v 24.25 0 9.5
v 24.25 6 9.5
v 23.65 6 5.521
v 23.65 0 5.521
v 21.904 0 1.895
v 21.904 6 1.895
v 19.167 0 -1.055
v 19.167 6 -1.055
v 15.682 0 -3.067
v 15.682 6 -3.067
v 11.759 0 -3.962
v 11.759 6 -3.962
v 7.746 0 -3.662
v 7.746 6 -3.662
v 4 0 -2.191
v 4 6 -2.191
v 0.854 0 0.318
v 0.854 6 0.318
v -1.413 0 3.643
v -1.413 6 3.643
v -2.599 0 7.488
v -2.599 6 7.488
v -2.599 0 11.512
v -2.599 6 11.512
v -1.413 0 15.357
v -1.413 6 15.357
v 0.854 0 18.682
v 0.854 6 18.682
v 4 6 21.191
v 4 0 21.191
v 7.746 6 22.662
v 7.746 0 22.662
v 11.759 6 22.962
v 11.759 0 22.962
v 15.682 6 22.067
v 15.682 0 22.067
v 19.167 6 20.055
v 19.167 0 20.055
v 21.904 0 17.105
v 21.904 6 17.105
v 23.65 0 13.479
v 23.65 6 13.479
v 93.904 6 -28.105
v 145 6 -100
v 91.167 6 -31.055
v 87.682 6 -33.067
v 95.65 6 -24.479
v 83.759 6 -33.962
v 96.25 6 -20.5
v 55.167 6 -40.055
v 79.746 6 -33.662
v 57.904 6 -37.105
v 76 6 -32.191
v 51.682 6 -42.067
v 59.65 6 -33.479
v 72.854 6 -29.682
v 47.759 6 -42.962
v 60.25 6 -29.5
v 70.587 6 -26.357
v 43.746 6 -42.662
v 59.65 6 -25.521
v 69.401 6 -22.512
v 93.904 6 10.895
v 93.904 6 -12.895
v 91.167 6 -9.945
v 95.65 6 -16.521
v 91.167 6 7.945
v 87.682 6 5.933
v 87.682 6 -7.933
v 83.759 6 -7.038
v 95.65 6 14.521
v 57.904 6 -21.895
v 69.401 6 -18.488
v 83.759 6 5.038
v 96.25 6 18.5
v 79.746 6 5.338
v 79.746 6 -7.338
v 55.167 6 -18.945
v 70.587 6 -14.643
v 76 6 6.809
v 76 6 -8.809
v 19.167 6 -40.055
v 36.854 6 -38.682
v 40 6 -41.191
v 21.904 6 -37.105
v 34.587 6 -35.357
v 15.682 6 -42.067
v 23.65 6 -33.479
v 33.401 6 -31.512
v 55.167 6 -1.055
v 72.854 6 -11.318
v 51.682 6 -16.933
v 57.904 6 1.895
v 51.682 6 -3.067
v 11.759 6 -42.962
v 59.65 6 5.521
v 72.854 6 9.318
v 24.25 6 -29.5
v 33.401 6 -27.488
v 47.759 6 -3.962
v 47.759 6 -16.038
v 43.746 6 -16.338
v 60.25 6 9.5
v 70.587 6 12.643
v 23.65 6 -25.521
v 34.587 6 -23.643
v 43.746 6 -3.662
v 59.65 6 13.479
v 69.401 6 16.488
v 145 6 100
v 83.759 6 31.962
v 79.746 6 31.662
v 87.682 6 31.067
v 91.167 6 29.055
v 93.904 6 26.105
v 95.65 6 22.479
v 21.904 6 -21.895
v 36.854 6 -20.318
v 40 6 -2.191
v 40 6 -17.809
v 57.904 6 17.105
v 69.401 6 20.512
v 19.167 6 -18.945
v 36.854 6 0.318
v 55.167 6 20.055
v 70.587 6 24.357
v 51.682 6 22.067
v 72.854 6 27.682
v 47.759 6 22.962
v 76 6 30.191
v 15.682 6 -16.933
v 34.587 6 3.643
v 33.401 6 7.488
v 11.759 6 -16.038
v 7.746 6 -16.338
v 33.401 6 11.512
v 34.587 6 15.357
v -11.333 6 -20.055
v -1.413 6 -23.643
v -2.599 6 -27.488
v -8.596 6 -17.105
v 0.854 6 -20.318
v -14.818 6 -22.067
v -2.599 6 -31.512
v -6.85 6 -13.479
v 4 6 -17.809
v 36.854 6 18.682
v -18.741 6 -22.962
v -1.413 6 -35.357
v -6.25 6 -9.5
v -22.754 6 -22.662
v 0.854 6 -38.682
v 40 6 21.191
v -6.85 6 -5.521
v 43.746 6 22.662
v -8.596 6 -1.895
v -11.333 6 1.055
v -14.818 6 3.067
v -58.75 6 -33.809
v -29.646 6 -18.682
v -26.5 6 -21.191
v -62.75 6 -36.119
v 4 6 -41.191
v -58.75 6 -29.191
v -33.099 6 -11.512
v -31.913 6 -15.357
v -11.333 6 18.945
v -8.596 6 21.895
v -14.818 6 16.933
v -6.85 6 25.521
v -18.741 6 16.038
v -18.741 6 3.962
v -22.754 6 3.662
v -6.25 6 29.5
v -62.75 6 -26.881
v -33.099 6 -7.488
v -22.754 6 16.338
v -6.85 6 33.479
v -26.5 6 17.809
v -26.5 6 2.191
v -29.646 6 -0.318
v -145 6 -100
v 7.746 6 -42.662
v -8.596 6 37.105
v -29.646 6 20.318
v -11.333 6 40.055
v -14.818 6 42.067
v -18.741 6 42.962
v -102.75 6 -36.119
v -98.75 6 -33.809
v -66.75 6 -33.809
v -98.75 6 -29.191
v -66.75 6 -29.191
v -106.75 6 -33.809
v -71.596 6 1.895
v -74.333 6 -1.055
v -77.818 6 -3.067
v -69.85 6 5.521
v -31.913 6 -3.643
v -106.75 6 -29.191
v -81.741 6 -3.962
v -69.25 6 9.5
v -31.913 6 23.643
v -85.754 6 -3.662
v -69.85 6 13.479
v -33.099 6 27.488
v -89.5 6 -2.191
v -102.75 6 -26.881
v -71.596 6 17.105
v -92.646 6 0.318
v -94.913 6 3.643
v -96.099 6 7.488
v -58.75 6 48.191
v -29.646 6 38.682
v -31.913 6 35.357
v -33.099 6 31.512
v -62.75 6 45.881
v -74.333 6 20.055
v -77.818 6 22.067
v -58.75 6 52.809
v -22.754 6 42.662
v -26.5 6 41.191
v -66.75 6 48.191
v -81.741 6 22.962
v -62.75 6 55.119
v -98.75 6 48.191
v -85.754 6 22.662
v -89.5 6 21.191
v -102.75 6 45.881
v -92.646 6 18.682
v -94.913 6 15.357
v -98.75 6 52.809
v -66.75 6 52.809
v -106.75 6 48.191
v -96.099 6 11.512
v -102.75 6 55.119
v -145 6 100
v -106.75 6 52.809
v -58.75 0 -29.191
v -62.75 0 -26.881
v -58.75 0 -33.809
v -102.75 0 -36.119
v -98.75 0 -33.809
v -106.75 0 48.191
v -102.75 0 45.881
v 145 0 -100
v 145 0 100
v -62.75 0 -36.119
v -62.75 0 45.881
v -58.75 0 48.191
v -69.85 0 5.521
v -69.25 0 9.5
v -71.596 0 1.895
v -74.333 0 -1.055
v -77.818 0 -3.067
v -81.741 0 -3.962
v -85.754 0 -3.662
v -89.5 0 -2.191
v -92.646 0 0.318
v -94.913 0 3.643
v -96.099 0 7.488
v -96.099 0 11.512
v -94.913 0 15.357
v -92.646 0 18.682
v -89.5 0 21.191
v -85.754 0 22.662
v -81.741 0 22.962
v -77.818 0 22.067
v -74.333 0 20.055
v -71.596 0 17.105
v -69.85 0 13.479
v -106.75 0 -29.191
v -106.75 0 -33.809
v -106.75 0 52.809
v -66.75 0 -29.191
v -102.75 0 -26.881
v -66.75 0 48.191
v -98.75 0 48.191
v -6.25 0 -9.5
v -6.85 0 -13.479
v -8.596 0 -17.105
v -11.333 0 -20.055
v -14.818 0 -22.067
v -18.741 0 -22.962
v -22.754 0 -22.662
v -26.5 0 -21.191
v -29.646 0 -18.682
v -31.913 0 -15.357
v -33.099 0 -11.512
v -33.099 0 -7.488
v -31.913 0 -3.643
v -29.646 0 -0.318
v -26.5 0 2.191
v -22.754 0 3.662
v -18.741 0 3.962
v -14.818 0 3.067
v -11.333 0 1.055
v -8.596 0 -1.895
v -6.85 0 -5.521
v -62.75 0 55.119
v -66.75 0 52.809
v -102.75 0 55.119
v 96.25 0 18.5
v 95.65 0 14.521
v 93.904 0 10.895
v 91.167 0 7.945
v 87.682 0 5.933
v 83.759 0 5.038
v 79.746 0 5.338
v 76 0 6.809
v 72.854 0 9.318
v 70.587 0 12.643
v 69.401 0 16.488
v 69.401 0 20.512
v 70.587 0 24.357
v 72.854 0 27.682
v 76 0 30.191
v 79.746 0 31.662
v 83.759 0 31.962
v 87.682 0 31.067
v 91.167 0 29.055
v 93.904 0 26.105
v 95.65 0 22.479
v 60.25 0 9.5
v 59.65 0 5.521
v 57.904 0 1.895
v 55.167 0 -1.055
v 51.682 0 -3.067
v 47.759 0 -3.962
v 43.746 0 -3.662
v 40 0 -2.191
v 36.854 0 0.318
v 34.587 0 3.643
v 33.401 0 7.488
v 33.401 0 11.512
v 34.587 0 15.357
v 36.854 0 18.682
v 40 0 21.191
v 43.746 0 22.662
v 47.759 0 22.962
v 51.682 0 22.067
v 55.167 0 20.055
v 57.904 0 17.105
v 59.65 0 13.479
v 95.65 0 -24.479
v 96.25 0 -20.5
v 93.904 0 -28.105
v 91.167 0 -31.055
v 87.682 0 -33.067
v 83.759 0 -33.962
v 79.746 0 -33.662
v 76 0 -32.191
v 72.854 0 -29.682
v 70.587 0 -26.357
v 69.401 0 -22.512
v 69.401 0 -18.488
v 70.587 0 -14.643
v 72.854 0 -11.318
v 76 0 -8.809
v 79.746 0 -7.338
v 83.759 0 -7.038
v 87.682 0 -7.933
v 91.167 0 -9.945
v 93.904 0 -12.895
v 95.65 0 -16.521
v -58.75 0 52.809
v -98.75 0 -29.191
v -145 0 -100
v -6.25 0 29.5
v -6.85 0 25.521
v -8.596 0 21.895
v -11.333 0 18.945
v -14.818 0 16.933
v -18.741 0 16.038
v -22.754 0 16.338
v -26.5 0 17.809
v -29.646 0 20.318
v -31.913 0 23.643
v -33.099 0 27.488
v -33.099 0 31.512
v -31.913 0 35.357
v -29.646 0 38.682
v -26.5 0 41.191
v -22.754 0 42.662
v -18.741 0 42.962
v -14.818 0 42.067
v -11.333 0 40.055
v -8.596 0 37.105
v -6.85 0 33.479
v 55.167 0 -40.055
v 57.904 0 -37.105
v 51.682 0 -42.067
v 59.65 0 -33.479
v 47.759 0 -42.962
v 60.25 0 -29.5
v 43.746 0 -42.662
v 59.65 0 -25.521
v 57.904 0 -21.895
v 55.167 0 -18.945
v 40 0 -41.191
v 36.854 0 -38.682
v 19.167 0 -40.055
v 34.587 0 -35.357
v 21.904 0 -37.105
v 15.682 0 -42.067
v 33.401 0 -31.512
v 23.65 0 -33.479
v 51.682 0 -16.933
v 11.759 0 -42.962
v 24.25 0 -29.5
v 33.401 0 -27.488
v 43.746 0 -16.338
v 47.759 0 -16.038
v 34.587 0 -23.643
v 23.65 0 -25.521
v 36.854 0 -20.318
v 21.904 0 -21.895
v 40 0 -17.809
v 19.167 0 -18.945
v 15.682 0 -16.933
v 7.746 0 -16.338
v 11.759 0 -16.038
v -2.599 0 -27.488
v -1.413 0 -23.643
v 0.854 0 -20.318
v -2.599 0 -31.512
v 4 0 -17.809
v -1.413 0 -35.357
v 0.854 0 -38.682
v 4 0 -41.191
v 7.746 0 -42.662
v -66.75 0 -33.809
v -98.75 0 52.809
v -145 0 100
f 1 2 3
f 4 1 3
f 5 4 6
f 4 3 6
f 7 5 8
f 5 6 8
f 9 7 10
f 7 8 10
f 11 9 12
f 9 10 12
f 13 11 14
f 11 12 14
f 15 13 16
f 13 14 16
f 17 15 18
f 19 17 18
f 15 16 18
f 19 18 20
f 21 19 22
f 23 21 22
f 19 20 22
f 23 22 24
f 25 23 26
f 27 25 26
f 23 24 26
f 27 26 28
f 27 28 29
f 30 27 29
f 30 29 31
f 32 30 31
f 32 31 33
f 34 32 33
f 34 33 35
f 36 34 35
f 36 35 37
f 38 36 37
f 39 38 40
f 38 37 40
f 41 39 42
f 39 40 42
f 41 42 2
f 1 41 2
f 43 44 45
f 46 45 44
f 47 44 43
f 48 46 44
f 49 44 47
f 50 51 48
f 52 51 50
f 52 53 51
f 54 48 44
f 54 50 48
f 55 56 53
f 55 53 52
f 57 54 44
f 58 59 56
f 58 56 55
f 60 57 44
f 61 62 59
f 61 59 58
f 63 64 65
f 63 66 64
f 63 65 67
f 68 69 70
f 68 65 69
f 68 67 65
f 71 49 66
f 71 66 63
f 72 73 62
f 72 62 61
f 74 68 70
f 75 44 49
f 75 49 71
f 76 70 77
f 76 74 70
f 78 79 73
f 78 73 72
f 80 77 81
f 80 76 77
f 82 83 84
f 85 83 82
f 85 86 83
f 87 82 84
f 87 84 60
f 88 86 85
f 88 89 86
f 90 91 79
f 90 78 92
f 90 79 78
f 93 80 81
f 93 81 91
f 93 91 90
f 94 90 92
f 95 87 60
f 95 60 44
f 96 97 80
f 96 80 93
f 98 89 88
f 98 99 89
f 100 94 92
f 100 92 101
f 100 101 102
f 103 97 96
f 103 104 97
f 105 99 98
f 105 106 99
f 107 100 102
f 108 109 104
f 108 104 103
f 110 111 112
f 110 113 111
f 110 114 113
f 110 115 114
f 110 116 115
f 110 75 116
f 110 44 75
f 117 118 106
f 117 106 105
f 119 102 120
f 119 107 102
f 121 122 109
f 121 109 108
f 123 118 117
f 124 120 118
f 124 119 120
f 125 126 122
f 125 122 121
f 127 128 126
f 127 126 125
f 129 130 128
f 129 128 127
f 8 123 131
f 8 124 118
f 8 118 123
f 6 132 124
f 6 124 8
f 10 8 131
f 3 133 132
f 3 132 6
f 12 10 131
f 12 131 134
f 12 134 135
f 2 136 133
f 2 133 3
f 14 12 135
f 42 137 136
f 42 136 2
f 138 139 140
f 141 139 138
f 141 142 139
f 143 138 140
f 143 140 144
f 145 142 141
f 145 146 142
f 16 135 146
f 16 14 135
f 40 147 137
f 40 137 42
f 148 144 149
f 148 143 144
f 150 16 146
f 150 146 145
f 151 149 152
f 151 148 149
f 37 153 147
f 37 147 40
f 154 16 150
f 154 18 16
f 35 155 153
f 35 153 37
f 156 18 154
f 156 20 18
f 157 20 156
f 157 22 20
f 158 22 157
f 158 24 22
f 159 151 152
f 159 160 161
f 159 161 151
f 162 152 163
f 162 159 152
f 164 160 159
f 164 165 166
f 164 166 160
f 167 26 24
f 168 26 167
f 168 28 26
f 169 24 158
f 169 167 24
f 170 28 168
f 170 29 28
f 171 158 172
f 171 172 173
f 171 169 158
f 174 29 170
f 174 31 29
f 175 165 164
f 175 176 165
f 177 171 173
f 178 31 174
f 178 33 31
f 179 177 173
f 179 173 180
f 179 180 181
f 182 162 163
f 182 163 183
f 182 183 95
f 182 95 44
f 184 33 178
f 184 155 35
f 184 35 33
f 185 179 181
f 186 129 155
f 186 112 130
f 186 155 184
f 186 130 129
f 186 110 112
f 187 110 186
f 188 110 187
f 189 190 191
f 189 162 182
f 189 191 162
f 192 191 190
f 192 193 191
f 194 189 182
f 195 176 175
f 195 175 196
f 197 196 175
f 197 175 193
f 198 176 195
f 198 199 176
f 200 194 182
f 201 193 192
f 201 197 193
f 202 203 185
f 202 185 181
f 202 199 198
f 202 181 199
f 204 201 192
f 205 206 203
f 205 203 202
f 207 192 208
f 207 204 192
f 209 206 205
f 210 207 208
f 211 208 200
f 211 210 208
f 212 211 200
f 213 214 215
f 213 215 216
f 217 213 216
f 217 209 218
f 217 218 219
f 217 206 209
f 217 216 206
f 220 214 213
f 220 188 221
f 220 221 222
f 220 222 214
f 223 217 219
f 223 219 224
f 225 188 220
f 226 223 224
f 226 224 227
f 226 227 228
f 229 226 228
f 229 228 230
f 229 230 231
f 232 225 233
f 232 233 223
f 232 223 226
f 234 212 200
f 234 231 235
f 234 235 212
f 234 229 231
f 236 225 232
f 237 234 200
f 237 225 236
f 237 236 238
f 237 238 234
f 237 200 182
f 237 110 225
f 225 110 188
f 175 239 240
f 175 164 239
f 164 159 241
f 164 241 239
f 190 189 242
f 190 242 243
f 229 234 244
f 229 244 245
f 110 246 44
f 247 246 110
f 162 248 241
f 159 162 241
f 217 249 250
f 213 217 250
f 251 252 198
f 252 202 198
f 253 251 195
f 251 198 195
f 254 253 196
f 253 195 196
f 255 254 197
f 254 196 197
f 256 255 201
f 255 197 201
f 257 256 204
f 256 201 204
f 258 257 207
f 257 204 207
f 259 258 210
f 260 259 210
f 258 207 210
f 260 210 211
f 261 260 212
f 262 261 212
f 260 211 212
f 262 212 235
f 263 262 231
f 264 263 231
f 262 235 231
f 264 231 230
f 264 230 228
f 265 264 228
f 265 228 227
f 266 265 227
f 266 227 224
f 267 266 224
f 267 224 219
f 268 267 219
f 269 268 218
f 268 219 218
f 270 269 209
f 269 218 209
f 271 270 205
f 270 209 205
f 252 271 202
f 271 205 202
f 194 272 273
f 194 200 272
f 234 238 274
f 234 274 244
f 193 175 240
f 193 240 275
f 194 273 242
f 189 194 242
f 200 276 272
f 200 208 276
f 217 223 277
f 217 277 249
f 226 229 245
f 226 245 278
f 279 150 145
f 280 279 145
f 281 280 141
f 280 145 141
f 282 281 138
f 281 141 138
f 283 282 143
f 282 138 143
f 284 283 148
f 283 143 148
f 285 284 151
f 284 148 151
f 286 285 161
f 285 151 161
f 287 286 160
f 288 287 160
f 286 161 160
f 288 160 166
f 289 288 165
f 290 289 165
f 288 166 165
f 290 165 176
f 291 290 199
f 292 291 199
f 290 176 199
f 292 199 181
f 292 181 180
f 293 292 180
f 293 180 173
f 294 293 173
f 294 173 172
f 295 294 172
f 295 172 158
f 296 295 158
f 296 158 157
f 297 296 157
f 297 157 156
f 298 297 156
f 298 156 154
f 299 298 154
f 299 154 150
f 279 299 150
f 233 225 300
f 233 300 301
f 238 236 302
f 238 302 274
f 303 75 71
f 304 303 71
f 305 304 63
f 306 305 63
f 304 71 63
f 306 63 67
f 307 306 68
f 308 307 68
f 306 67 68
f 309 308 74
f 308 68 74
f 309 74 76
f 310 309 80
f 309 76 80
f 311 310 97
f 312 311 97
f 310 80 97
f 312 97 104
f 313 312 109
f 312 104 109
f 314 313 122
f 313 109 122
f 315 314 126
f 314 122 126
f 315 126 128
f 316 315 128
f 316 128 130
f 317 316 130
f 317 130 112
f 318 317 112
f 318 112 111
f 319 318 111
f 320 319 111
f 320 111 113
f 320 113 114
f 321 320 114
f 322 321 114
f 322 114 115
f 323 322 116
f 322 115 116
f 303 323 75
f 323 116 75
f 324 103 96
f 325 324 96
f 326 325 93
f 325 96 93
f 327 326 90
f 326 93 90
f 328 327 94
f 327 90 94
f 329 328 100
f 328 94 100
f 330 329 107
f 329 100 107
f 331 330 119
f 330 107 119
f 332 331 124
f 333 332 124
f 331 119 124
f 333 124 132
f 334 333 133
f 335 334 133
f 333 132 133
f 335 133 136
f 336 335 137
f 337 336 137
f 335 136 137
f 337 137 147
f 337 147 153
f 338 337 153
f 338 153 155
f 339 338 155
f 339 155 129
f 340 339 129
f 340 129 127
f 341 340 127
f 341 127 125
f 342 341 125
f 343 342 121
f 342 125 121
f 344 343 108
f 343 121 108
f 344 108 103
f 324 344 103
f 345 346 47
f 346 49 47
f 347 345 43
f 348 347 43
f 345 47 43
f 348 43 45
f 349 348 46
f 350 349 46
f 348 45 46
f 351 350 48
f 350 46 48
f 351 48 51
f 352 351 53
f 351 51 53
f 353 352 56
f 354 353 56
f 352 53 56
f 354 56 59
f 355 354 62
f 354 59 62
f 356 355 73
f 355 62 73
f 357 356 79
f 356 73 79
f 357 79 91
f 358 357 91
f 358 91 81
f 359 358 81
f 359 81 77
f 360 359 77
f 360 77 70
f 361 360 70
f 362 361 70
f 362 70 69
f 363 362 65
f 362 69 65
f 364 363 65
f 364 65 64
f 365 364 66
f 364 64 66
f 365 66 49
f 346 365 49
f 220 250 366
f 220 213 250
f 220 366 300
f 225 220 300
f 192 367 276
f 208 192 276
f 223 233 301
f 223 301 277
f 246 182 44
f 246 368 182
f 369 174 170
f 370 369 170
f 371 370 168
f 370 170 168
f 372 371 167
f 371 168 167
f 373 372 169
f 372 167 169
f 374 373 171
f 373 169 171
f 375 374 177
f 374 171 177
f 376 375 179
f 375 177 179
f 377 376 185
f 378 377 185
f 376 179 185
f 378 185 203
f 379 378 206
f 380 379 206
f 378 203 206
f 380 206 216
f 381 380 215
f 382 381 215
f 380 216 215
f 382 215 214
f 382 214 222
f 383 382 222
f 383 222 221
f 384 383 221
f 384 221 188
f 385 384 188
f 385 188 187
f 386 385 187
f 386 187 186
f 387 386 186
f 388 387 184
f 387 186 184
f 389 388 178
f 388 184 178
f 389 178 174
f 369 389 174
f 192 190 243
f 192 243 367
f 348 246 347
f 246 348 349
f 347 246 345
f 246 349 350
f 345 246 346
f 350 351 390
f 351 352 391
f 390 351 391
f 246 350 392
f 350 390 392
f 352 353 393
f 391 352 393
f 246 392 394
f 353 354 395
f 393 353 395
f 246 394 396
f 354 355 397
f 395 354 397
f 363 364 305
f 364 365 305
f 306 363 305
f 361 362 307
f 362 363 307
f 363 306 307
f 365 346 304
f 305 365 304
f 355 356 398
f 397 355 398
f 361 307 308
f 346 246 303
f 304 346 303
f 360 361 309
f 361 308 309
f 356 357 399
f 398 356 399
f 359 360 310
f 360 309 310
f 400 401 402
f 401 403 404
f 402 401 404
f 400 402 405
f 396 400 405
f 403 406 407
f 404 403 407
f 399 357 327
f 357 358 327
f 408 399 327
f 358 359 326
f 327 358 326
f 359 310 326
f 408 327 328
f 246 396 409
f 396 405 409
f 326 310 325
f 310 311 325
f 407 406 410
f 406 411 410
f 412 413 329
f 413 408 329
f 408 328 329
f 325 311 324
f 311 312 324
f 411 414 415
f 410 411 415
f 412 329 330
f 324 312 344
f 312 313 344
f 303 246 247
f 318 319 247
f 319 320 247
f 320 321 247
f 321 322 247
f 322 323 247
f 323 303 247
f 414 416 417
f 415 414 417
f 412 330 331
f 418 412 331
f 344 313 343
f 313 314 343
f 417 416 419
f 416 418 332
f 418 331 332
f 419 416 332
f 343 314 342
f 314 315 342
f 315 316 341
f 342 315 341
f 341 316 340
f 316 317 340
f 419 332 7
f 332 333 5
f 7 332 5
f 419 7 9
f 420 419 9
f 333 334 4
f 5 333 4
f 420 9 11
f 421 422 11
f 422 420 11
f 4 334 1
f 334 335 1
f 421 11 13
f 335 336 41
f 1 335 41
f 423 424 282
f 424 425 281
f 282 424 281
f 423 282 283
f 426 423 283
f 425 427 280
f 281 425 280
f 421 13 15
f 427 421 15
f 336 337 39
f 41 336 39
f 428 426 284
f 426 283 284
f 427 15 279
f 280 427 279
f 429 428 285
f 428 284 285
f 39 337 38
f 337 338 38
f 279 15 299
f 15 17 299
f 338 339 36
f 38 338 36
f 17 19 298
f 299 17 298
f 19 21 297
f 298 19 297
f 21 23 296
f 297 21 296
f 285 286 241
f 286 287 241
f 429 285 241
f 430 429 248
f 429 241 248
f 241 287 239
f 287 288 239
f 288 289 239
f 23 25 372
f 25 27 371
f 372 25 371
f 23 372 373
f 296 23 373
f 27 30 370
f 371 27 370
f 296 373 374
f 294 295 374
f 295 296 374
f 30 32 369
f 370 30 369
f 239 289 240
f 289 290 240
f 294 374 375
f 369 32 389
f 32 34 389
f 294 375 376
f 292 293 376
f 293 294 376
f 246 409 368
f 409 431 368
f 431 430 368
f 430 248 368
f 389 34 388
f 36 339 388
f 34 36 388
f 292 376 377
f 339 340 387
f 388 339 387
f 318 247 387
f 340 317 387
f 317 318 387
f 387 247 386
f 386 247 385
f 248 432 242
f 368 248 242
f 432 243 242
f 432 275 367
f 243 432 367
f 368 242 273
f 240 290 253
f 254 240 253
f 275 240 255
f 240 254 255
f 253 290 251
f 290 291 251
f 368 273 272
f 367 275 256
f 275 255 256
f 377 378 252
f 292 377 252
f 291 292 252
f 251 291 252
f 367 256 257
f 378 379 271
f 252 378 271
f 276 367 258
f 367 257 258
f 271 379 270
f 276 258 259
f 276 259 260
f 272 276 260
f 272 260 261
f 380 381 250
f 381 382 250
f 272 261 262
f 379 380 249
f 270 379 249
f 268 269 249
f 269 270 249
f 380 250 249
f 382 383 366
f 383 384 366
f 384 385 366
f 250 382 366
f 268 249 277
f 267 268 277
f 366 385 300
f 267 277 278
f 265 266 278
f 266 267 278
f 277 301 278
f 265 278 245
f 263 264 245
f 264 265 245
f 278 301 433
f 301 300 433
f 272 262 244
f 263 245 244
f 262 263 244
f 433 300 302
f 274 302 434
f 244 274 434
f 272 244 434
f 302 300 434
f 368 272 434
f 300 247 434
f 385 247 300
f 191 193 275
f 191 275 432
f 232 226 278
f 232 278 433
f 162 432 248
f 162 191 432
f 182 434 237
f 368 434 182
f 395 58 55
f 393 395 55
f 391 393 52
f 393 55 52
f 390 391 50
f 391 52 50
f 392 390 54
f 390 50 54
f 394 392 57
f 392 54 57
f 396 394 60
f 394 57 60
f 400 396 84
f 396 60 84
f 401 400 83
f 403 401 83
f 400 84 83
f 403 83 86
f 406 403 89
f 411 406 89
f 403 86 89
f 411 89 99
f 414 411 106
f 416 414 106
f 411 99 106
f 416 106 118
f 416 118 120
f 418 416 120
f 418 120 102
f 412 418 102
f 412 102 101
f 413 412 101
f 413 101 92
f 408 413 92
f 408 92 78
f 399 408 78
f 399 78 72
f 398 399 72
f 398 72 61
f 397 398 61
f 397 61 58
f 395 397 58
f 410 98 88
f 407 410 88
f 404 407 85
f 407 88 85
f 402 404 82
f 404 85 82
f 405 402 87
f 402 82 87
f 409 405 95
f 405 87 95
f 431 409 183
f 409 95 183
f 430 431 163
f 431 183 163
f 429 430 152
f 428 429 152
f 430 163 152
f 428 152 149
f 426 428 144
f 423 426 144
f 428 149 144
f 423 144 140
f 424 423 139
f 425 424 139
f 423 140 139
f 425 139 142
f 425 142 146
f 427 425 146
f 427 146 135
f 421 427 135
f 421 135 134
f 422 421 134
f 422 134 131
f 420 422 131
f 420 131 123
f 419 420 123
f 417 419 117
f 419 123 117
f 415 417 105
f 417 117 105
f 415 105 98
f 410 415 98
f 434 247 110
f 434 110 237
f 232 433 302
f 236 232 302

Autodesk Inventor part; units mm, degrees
ref_plane "YZ Plane" through (0, 0, 0) normal (1, 0, 0) x (0, 1, 0)
ref_plane "XZ Plane" through (0, 0, 0) normal (0, 1, 0) x (-1, 0, 0)
ref_plane "XY Plane" through (0, 0, 0) normal (0, 0, 1) x (1, 0, 0)
sketch "Sketch1" plane through (0, 0, 0) normal (0, 1, 0) x (-1, 0, 0)
  line L0 (145, -100) -> (-145, -100)
  line L1 (-145, -100) -> (-145, 100)
  line L2 (-145, 100) -> (145, 100)
  line L3 (145, 100) -> (145, -100)
  line L4 (210, 0) -> (-210, 0) projected
  line L5 (0, -140) -> (0, 140) projected
  point P0 (0, 0)
  dimension "d30" = 290
  dimension "d31" = 200
extrude "Extrusion1" add sketch "Sketch1" along normal blind 6
sketch "Sketch2" plane through (0, 6, 0) normal (0, 1, 0) x (1, 0, 0)
  circle A0 centre (-19.75, -29.5) radius 13.5
  circle A1 centre (-82.75, -9.5) radius 13.5
  circle A2 centre (-19.75, 9.5) radius 13.5
  circle A3 centre (46.75, 29.5) radius 13.5
  circle A4 centre (82.75, 20.5) radius 13.5
  circle A5 centre (10.75, 29.5) radius 13.5
  circle A6 centre (10.75, -9.5) radius 13.5
  circle A7 centre (46.75, -9.5) radius 13.5
  circle A8 centre (82.75, -18.5) radius 13.5
  line L0 (-96.25, 43) -> (96.25, 43)
  line L1 (96.25, 43) -> (96.25, -43)
  line L2 (96.25, -43) -> (-96.25, -43)
  line L3 (-96.25, -43) -> (-96.25, 43)
  line L4 (145, 100) -> (-145, 100) projected
  line L5 (145, -100) -> (145, 100) projected
  line L6 (0, 140) -> (0, -140) projected
  line L7 (-210, 0) -> (210, 0) projected
  line L8 (-102.75, 31.5) -> (-62.75, 31.5)
  line L9 (-62.75, 31.5) -> (-62.75, -50.5)
  line L10 (-62.75, -50.5) -> (-102.75, -50.5)
  line L11 (-102.75, -50.5) -> (-102.75, 31.5)
  line L12 (-106.75, 33.8094) -> (-102.75, 36.1188)
  line L13 (-102.75, 36.1188) -> (-98.75, 33.8094)
  line L14 (-98.75, 33.8094) -> (-98.75, 29.1906)
  line L15 (-98.75, 29.1906) -> (-102.75, 26.8812)
  line L16 (-102.75, 26.8812) -> (-106.75, 29.1906)
  line L17 (-106.75, 29.1906) -> (-106.75, 33.8094)
  line L18 (-62.75, 36.1188) -> (-58.75, 33.8094)
  line L19 (-58.75, 33.8094) -> (-58.75, 29.1906)
  line L20 (-58.75, 29.1906) -> (-62.75, 26.8812)
  line L21 (-62.75, 26.8812) -> (-66.75, 29.1906)
  line L22 (-66.75, 29.1906) -> (-66.75, 33.8094)
  line L23 (-66.75, 33.8094) -> (-62.75, 36.1188)
  line L24 (-102.75, -45.8812) -> (-98.75, -48.1906)
  line L25 (-98.75, -48.1906) -> (-98.75, -52.8094)
  line L26 (-98.75, -52.8094) -> (-102.75, -55.1188)
  line L27 (-102.75, -55.1188) -> (-106.75, -52.8094)
  line L28 (-106.75, -52.8094) -> (-106.75, -48.1906)
  line L29 (-106.75, -48.1906) -> (-102.75, -45.8812)
  line L30 (-62.75, -45.8812) -> (-58.75, -48.1906)
  line L31 (-58.75, -48.1906) -> (-58.75, -52.8094)
  line L32 (-58.75, -52.8094) -> (-62.75, -55.1188)
  line L33 (-62.75, -55.1188) -> (-66.75, -52.8094)
  line L34 (-66.75, -52.8094) -> (-66.75, -48.1906)
  line L35 (-66.75, -48.1906) -> (-62.75, -45.8812)
  point P0 (-58.75, 31.5)
  point P1 (-98.75, -50.5)
  point P2 (-106.75, -50.5)
  point P3 (-66.75, -50.5)
  point P4 (-58.75, -50.5)
  dimension "d3" = 27
  dimension "d19" = 30.5
  dimension "d20" = 36
  dimension "d23" = 19
  dimension "d24" = 9
  dimension "d25" = 36
  dimension "d26" = 11
  dimension "d27" = 9
  dimension "d28" = 11
  dimension "d29" = 63
  dimension "d35" = 41
  dimension "d36" = 41
  dimension "d37" = 20
  dimension "d38" = 20
  dimension "d54" = 8
  dimension "d55" = 8
  dimension "d56" = 8
  dimension "d57" = 8
extrude "Extrusion2" cut sketch "Sketch2" against normal blind 30 contours A0 | A8 | L6 A6 L7 | A6 L6 | L30 L31 L32 L33 L34 L10 L9 | L9 L10 L34 L35 | A1 L7 | L7 A1 | L7 A2 | A2 L7 | L21 L22 L8 L9 | L9 L8 L22 L23 L18 L19 L20 | A4 | A3 | A6 L7 | L7 A7 | A7 L7 | L6 A5 | A5 L6 | L25 L26 L27 L28 L29 L11 L10 | L10 L11 L24 L25 | L14 L15 L11 L8 | L8 L11 L16 L17 L12 L13 L14 picked at (6.7806, -6.3333)
equation "\"d30\" = BoxLength"
equation "\"d31\" = BoxWidth"
equation "\"d3\" = JS_Hole_dia"
equation "\"d36\" = 0.5 * JS_SH_L"
equation "\"d37\" = 0.5 * JS_SH_W"
equation "\"d38\" = 0.5 * JS_SH_W"
equation "\"d55\" = JS_SH_hex_width"
equation "\"d56\" = JS_SH_hex_width"
equation "\"d57\" = JS_SH_hex_width"
equation "\"BoxLength\" = 290"
equation "\"BoxWidth\" = 200"
equation "\"JS_SH_L\" = 82"
equation "\"JS_SH_dia\" = 5"
equation "\"SheetThickness\" = 6"
equation "\"CornerOffset\" = 5"
equation "\"NutS\" = 5.7"
equation "\"NutThreadD2\" = 4.17"
equation "\"SideNutWidth\" = 2.5"
equation "\"JS_Hole_dia\" = 27"
equation "\"JS_SH_hex_width\" = 8"
equation "\"JS_SH_W\" = 40"
properties part number "sega_straight_b1_v2"
